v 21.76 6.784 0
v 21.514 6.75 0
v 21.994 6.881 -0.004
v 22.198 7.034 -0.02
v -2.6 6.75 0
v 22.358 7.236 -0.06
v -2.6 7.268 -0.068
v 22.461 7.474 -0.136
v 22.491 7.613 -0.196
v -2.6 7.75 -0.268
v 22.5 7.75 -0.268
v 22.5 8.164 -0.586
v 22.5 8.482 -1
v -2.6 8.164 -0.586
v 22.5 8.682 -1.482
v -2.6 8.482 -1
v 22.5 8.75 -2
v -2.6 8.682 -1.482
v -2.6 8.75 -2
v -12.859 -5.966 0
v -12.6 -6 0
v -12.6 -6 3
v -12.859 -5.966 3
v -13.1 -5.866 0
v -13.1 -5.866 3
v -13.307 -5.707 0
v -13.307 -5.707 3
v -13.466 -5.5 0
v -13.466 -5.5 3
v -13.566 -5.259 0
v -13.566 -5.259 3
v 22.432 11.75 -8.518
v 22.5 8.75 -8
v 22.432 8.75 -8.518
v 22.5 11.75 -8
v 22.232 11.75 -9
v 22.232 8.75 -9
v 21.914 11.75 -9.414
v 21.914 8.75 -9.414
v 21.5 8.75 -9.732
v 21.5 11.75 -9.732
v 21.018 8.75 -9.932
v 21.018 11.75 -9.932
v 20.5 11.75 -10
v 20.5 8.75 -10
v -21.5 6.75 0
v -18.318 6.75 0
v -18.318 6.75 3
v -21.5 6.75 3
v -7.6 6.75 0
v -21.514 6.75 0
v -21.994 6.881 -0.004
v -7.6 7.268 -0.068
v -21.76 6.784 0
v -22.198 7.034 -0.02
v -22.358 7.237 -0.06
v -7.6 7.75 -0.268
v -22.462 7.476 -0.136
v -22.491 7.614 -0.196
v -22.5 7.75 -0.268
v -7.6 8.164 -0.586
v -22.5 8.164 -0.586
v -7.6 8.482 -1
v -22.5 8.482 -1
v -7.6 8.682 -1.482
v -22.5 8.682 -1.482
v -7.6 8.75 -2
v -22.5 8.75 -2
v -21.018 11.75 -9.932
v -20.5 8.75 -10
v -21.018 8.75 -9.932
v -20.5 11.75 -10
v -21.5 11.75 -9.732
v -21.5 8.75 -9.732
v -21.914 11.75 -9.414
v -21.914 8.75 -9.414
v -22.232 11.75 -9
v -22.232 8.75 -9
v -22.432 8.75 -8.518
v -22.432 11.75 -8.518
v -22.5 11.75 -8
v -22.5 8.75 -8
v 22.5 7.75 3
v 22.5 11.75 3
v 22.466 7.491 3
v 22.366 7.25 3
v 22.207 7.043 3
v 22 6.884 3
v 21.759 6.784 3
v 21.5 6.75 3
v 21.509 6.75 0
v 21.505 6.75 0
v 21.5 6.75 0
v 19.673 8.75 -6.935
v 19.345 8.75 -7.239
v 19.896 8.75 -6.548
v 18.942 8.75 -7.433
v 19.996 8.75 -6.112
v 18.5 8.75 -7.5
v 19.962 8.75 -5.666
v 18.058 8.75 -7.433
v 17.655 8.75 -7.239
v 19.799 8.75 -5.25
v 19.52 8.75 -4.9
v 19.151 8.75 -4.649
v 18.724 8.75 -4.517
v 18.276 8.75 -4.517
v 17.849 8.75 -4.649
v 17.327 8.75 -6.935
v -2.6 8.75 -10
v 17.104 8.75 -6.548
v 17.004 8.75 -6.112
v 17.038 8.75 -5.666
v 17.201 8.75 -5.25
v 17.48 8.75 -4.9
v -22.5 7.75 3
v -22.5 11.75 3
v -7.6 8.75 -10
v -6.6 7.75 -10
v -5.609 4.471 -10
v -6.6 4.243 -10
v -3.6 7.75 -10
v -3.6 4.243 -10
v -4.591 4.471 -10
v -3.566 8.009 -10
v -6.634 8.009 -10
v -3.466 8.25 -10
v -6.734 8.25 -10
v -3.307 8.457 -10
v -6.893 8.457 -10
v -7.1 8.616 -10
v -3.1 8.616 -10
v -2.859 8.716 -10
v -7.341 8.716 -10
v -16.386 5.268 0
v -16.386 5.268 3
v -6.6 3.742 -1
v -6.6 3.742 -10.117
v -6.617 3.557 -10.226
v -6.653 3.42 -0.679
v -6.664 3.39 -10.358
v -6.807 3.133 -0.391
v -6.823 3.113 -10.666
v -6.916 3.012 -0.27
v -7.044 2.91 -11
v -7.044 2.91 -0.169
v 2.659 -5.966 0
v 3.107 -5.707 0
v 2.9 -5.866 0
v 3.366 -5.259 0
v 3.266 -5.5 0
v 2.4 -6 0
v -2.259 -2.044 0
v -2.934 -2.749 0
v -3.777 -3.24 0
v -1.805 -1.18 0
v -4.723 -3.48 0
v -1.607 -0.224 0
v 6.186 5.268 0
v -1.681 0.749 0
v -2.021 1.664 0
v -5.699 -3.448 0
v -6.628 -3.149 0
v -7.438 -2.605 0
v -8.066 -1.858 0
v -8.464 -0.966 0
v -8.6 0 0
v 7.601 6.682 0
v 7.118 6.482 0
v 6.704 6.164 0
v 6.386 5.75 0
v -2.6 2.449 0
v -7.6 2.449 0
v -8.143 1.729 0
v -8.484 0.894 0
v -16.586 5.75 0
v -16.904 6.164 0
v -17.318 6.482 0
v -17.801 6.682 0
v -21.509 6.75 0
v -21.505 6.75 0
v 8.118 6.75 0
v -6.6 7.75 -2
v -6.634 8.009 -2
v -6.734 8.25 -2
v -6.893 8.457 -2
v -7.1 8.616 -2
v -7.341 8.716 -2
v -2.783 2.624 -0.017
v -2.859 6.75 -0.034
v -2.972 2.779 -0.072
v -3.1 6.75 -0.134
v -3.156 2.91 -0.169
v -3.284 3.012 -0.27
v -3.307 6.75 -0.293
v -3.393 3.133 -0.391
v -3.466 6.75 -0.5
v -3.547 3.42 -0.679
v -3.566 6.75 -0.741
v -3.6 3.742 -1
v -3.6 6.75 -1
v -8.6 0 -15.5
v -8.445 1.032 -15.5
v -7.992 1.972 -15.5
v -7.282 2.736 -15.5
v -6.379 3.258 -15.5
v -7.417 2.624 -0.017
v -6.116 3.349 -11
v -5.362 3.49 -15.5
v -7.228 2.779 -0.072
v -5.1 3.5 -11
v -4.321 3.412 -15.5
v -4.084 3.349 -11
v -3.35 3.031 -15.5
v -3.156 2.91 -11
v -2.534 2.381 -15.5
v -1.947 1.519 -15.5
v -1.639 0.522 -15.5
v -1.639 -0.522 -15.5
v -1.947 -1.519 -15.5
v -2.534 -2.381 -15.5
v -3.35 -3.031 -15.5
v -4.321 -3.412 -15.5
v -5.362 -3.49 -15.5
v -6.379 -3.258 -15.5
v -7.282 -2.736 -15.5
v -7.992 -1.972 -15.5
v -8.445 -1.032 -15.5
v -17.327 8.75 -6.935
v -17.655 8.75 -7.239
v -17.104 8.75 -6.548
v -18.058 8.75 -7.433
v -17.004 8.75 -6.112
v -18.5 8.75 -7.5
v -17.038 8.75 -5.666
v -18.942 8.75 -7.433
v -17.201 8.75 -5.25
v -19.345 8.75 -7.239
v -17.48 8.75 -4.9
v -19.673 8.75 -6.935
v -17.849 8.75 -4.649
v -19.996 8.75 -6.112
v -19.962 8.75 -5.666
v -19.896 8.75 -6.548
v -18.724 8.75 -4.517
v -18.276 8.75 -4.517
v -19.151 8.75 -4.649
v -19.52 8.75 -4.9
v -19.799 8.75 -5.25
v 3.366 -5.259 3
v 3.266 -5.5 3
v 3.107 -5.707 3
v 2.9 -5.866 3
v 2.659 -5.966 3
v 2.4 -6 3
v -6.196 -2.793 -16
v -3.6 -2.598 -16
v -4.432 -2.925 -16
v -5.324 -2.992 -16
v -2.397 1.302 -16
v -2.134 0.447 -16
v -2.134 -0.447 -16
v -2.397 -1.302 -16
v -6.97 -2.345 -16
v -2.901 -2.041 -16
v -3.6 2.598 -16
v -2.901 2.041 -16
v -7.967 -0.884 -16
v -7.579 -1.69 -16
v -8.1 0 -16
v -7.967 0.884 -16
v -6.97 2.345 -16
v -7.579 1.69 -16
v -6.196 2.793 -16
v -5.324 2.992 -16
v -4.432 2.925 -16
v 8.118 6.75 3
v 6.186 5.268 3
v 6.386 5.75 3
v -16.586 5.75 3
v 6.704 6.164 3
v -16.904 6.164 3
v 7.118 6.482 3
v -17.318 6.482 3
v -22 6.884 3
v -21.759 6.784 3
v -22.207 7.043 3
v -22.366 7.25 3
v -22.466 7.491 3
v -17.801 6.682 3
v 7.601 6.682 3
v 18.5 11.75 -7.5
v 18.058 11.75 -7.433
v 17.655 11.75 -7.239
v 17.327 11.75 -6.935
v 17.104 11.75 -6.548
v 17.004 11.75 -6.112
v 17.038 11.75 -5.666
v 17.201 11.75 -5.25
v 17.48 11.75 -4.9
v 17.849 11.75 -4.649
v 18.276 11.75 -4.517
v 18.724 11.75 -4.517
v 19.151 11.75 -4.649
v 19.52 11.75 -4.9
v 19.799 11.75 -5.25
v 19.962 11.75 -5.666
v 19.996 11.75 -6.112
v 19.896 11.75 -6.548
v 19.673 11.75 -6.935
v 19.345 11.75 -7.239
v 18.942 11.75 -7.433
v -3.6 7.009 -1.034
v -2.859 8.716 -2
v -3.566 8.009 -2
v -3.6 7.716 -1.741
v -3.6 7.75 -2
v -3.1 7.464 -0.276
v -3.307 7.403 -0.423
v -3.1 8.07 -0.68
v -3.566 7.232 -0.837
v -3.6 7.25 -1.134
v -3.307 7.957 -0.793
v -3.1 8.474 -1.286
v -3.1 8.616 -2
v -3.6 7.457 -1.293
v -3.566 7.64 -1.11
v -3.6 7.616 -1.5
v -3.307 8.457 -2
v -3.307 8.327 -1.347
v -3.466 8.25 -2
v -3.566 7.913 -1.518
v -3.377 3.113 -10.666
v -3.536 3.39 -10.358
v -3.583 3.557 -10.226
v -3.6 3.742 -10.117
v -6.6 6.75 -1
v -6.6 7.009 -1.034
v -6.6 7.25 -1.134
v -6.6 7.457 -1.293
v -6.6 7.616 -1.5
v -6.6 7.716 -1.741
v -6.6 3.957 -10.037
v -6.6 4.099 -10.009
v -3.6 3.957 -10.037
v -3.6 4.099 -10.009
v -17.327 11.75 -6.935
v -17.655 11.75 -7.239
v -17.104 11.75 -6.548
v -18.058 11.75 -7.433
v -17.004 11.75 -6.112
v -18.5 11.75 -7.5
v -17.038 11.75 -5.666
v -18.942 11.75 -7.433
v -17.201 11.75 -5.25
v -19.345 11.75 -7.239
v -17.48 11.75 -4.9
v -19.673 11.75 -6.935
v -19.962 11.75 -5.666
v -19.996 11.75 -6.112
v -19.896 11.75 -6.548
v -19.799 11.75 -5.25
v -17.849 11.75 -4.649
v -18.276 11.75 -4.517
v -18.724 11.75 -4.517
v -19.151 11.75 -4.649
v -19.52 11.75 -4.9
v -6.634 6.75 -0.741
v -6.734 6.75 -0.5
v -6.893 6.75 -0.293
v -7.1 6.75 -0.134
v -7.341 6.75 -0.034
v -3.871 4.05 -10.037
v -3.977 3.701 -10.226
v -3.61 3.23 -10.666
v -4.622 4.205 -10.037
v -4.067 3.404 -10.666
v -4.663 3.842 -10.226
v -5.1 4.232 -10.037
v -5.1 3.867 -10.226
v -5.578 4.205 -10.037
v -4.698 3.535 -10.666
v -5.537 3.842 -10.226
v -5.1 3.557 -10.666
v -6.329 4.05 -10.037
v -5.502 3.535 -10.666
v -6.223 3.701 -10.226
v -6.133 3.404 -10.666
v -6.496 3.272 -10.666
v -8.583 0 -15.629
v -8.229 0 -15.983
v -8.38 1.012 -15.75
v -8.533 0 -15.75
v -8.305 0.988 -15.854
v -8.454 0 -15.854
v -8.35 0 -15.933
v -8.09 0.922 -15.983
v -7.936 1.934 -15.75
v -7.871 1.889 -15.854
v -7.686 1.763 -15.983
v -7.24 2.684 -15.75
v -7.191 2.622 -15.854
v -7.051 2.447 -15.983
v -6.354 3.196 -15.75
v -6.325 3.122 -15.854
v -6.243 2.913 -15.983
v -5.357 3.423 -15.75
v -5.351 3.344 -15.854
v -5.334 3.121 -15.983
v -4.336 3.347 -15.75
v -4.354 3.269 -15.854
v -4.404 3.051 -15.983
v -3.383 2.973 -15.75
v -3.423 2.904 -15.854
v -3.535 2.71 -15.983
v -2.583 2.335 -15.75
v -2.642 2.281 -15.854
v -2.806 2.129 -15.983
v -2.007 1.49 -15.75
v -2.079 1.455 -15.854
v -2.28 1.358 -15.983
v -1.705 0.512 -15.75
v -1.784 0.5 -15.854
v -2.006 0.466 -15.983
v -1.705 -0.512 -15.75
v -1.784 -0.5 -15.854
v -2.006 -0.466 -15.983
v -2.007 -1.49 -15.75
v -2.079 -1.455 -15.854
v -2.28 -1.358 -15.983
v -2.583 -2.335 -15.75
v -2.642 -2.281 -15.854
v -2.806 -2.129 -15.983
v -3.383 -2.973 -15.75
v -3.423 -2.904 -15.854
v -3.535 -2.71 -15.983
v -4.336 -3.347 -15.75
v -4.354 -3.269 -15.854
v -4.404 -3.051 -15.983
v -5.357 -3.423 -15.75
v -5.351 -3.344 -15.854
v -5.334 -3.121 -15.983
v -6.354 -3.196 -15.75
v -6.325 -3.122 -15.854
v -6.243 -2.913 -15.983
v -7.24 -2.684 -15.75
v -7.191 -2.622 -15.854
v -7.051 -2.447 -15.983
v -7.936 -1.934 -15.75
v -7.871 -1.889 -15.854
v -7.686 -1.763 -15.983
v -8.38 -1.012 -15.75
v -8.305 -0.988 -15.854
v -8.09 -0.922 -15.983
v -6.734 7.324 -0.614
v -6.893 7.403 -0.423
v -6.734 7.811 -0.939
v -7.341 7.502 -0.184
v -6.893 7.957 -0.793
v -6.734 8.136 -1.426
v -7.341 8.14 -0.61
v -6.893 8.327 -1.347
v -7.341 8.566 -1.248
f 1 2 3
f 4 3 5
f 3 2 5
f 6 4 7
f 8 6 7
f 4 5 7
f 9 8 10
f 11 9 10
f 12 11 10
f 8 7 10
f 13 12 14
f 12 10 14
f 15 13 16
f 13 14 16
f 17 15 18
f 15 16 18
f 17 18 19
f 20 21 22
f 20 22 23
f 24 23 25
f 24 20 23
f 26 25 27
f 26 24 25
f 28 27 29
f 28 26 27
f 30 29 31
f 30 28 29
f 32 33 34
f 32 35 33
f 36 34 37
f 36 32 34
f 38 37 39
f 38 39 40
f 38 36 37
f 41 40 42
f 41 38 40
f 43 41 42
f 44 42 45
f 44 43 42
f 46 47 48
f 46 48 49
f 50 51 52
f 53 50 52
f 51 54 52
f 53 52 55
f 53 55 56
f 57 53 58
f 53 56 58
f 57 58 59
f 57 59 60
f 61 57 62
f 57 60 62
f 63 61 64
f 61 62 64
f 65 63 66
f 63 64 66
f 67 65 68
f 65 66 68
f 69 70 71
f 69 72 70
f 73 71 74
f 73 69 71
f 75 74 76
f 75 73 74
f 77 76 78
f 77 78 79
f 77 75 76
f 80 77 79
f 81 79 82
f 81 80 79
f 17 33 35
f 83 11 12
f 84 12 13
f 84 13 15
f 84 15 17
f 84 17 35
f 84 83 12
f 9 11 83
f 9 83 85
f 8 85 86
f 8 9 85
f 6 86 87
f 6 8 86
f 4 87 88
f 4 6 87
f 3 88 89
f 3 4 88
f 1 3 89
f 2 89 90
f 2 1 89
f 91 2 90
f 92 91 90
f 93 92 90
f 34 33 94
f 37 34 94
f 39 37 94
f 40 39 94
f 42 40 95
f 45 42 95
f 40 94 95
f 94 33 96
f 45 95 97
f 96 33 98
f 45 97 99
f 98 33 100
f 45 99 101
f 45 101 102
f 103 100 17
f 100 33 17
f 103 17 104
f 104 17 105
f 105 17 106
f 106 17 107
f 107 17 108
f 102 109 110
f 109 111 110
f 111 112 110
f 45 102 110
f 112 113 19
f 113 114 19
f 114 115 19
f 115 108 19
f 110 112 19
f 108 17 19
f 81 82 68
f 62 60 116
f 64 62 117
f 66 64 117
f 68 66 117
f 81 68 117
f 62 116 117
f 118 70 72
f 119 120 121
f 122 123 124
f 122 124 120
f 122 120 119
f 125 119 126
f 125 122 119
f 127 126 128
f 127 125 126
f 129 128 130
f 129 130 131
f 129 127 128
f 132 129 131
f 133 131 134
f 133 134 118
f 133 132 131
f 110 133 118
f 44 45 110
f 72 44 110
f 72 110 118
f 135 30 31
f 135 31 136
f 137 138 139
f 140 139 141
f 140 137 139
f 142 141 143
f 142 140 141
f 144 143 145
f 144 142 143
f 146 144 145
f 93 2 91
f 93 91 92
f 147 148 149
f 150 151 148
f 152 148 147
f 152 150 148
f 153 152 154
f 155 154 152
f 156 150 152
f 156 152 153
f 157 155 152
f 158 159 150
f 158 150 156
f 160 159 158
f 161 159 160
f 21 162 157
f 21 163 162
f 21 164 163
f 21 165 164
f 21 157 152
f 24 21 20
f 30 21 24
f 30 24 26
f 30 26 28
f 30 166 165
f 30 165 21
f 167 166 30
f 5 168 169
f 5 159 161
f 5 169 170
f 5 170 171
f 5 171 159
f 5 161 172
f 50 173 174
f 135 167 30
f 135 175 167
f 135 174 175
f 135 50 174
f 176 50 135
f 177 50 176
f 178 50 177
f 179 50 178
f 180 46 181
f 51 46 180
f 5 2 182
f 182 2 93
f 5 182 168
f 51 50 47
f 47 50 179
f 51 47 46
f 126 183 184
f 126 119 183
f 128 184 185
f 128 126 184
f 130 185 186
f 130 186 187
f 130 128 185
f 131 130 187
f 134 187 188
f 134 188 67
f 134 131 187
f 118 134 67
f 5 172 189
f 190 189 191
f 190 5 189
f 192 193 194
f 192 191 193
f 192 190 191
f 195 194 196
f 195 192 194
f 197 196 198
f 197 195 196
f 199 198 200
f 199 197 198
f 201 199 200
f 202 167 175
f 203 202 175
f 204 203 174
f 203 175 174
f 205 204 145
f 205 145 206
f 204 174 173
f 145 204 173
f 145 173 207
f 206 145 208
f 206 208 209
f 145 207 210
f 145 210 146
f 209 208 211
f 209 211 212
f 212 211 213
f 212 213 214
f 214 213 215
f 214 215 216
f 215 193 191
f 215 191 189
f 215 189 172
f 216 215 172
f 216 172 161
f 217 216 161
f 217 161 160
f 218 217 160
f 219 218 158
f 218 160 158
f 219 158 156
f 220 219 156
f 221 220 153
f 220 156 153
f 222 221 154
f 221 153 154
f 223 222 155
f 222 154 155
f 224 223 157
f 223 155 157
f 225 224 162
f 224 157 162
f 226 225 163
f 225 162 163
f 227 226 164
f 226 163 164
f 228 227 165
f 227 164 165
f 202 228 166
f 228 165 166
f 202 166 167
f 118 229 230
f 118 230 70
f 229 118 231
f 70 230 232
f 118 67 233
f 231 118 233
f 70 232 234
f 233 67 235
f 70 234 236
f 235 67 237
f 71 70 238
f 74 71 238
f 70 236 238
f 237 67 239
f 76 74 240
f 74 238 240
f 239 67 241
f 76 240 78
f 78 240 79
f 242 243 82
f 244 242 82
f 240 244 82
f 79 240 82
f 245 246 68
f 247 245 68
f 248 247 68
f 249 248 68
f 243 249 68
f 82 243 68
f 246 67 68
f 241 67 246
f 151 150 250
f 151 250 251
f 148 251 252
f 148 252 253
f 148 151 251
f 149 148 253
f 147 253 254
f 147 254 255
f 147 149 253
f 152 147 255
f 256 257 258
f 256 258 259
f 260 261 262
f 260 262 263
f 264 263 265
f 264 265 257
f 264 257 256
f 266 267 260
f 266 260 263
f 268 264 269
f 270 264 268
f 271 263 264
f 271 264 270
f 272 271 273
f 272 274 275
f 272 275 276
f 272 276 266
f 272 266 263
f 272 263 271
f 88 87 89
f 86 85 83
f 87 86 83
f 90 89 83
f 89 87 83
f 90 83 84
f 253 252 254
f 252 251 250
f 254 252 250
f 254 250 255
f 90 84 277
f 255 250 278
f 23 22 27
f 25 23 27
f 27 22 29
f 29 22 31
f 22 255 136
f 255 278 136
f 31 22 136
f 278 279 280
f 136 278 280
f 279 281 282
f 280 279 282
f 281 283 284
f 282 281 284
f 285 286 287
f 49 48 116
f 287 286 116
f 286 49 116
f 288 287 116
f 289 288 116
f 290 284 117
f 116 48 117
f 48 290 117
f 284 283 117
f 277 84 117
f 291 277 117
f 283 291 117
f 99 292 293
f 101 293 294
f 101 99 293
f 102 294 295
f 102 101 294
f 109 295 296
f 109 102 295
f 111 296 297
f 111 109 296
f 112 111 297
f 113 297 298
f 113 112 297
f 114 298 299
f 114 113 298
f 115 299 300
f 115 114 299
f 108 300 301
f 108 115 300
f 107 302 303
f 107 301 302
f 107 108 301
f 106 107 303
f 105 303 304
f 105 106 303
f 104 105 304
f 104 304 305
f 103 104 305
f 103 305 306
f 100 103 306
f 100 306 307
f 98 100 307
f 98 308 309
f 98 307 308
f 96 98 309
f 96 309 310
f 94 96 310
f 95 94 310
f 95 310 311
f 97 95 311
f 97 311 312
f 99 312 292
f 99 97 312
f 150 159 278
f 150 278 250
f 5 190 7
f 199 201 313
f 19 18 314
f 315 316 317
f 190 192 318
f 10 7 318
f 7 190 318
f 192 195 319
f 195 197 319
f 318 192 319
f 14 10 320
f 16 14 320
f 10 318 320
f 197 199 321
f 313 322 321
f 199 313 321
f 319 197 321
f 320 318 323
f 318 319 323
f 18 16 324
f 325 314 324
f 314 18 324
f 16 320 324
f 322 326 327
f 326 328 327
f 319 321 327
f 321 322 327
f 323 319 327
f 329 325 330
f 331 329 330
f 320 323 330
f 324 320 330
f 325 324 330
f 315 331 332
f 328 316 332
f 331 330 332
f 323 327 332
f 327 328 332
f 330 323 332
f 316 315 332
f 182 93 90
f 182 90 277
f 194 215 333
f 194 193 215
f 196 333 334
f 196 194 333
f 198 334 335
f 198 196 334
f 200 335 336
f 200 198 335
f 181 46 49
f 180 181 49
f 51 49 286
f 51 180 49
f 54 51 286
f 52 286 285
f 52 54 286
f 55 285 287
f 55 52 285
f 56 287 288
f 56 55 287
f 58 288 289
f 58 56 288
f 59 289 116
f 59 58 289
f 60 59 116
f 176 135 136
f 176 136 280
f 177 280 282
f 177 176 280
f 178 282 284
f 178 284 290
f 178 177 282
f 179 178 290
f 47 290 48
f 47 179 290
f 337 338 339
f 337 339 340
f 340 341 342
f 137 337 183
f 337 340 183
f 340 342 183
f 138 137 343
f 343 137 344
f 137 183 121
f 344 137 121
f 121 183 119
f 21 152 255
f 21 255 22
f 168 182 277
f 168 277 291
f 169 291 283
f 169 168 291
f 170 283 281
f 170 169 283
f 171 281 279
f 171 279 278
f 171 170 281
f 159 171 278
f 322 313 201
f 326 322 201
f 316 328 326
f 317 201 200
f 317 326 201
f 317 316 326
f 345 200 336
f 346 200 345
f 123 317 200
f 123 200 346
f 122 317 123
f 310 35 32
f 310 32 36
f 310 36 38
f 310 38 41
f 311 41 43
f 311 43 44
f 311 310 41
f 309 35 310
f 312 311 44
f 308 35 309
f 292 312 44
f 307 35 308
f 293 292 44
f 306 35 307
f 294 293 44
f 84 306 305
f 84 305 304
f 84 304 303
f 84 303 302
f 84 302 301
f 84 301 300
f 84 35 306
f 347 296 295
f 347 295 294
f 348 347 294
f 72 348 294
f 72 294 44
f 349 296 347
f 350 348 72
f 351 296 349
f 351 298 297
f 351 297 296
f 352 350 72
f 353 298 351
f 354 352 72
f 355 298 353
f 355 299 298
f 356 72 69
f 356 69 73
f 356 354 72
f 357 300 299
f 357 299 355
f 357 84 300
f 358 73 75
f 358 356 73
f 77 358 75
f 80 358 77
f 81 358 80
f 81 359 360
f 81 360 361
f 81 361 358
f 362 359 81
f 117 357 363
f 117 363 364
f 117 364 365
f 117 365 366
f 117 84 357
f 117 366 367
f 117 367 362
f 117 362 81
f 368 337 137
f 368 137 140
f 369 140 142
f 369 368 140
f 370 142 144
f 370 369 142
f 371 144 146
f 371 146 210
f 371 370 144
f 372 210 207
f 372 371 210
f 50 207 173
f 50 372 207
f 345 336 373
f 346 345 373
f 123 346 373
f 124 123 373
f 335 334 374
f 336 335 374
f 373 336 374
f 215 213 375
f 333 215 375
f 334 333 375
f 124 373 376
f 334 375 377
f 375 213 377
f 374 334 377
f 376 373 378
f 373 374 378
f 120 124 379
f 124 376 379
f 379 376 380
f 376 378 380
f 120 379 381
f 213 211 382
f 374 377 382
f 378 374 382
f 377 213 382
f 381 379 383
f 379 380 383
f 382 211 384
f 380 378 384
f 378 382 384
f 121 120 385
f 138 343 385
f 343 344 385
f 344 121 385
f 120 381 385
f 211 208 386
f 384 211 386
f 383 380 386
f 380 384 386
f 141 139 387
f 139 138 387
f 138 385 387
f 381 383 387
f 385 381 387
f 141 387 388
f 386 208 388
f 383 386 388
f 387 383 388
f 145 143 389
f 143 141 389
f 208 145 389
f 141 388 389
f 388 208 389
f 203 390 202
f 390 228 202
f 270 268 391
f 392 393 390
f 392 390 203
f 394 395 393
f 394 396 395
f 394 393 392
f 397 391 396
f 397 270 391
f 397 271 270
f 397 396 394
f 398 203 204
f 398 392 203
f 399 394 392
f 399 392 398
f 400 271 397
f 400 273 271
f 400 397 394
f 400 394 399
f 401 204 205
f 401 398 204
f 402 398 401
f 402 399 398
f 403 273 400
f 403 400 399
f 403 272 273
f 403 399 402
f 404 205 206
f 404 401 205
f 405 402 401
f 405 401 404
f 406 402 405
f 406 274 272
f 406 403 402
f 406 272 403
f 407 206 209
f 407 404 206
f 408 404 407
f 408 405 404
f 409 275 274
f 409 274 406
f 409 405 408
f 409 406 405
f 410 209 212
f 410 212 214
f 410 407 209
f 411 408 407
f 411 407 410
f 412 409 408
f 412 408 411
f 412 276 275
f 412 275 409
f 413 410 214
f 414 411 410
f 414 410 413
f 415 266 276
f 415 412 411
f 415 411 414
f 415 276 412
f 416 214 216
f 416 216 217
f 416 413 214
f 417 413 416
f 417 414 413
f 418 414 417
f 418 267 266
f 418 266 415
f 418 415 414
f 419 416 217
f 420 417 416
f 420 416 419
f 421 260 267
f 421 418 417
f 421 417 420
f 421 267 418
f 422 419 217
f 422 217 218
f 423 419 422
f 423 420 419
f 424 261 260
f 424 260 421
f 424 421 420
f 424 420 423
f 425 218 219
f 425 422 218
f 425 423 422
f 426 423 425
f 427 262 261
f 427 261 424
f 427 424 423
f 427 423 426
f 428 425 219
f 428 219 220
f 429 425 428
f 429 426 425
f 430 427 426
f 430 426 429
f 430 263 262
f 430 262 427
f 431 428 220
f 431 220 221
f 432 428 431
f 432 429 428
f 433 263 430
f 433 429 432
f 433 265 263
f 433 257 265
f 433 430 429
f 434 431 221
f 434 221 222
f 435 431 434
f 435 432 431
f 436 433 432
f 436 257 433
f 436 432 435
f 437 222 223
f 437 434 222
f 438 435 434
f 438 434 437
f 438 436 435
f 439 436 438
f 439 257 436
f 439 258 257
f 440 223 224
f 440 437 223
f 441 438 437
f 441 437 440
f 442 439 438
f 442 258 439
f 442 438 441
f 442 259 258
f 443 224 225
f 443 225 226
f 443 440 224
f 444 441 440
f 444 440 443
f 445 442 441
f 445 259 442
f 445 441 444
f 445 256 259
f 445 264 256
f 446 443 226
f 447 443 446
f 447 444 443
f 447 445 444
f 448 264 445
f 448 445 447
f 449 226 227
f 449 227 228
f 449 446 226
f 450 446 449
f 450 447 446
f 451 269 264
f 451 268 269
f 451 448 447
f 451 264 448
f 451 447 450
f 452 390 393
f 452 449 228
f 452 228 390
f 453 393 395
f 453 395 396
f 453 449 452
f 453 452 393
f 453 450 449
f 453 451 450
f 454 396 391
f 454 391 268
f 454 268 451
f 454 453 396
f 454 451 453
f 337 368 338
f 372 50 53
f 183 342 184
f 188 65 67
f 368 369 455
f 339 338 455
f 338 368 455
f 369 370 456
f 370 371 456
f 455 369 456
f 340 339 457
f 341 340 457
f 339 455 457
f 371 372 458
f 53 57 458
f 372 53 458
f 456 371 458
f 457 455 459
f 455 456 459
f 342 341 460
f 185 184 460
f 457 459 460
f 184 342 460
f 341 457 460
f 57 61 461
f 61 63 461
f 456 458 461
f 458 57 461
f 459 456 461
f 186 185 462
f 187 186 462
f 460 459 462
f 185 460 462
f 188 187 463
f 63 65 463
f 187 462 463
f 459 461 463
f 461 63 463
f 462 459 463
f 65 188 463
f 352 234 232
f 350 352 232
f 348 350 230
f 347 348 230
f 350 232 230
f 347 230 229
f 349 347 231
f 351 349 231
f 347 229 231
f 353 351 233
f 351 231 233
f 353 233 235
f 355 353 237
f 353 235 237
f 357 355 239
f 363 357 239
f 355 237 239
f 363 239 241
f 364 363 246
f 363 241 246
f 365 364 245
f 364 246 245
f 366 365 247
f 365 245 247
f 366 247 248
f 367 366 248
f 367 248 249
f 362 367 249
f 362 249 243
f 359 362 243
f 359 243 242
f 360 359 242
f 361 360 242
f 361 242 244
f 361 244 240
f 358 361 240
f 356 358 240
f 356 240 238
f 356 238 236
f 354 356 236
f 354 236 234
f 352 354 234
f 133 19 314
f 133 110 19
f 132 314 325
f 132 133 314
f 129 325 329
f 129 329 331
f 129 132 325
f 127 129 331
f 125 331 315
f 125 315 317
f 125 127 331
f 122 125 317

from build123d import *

# Parameters (mm, degrees)
BOSS_EXTRUDE1_DEPTH = 3
SKETCH4_W           = 45
SKETCH4_H           = 3
BOSS_EXTRUDE2_DEPTH = 10
FILLET1_R           = 2
FILLET2_R           = 2
SKETCH5_R           = 1.5
CUT_EXTRUDE1_DEPTH  = 29.702134145
SKETCH6_R           = 3.5
BOSS_EXTRUDE3_DEPTH = 16
FILLET3_R           = 0.5
SKETCH7_W           = 10
SKETCH7_H           = 8.75
BOSS_EXTRUDE4_DEPTH = 1.5
FILLET4_R           = 1


with BuildPart() as part:
    # Sketch3 → Boss-Extrude1 (new body)
    with BuildSketch(Plane.XY):
        with BuildLine():
            Line((2.4, -6), (-12.6, -6))
            ThreePointArc((-12.6, -6), (-13.208761429, -5.79335334), (-13.565925826, -5.258819045))
            Line((-13.565925826, -5.258819045), (-16.386481515, 5.26763809))
            ThreePointArc((-16.386481515, 5.26763809), (-17.100810309, 6.336706681), (-18.318333167, 6.75))
            Line((-18.318333167, 6.75), (-21.5, 6.75))
            ThreePointArc((-21.5, 6.75), (-22.207106781, 7.042893219), (-22.5, 7.75))
            Line((-22.5, 7.75), (-22.5, 11.75))
            Line((-22.5, 11.75), (22.5, 11.75))
            Line((22.5, 11.75), (22.5, 7.75))
            ThreePointArc((22.5, 7.75), (22.207106781, 7.042893219), (21.5, 6.75))
            Line((21.5, 6.75), (8.118333167, 6.75))
            ThreePointArc((8.118333167, 6.75), (6.900810309, 6.336706681), (6.186481515, 5.26763809))
            Line((6.186481515, 5.26763809), (3.365925826, -5.258819045))
            ThreePointArc((3.365925826, -5.258819045), (3.008761429, -5.79335334), (2.4, -6))
        make_face()
    extrude(amount=BOSS_EXTRUDE1_DEPTH)

    # Sketch4 → Boss-Extrude2 (add)
    with BuildSketch(Plane(origin=(0, 0, 0), x_dir=(-1, 0, 0), z_dir=(0, 0, -1))):
        with Locations((0, 10.25)):
            Rectangle(SKETCH4_W, SKETCH4_H)
    extrude(amount=BOSS_EXTRUDE2_DEPTH)

    # Fillet1
    fillet1_edges = [part.edges().sort_by_distance(p)[0] for p in [
        (0, 8.75, 0),
    ]]
    fillet(fillet1_edges, radius=FILLET1_R - 0.0001)  # a hair under: the kernel refuses the full size

    # Fillet2
    fillet2_edges = [part.edges().sort_by_distance(p)[0] for p in [
        (22.5, 10.25, -10),
        (-22.5, 10.25, -10),
    ]]
    fillet(fillet2_edges, radius=FILLET2_R)

    # Sketch5 → Cut-Extrude1 (cut, through all)
    with BuildSketch(Plane.XZ.offset(-8.75)):
        with Locations(Location((-18.5, -6, 0), (0, 0, 270))):
            Circle(SKETCH5_R)
    cut_extrude1 = extrude(amount=-CUT_EXTRUDE1_DEPTH, mode=Mode.SUBTRACT)

    # Mirror1: Cut-Extrude1 across plane
    add(cut_extrude1.mirror(Plane(origin=(0, 0, 0), x_dir=(0, 0, 1), z_dir=(1, 0, 0))), mode=Mode.SUBTRACT)

    # Sketch6 → Boss-Extrude3 (add)
    with BuildSketch(Plane(origin=(0, 0, 0), x_dir=(-1, 0, 0), z_dir=(0, 0, -1))):
        with Locations((5.1, 0)):
            Circle(SKETCH6_R)
    extrude(amount=BOSS_EXTRUDE3_DEPTH)

    # Fillet3
    fillet3_edges = [part.edges().sort_by_distance(p)[0] for p in [
        (-1.6, 0, -16),
    ]]
    fillet(fillet3_edges, radius=FILLET3_R)

    # Sketch7 → Boss-Extrude4 (add, symmetric)
    with BuildSketch(Plane(origin=(-5.1, 0, 0), x_dir=(0, 0, -1), z_dir=(1, 0, 0))):
        with Locations((5, 4.375)):
            Rectangle(SKETCH7_W, SKETCH7_H)
    extrude(amount=BOSS_EXTRUDE4_DEPTH, both=True)

    # Fillet4
    fillet4_edges = [part.edges().sort_by_distance(p)[0] for p in [
        (-3.6, 8.164242852, -0.585757148),
        (-6.6, 4.95618883, 0),
        (-6.6, 8.164242852, -0.585757148),
        (-6.6, 8.75, -5.99995),
        (-3.6, 8.75, -5.99995),
        (-3.6, 4.95618883, 0),
        (-6.6, 3.16227766, -5),
        (-5.1, 3.5, -10),
        (-3.6, 3.16227766, -5),
    ]]
    fillet(fillet4_edges, radius=FILLET4_R)


solid = part.part
